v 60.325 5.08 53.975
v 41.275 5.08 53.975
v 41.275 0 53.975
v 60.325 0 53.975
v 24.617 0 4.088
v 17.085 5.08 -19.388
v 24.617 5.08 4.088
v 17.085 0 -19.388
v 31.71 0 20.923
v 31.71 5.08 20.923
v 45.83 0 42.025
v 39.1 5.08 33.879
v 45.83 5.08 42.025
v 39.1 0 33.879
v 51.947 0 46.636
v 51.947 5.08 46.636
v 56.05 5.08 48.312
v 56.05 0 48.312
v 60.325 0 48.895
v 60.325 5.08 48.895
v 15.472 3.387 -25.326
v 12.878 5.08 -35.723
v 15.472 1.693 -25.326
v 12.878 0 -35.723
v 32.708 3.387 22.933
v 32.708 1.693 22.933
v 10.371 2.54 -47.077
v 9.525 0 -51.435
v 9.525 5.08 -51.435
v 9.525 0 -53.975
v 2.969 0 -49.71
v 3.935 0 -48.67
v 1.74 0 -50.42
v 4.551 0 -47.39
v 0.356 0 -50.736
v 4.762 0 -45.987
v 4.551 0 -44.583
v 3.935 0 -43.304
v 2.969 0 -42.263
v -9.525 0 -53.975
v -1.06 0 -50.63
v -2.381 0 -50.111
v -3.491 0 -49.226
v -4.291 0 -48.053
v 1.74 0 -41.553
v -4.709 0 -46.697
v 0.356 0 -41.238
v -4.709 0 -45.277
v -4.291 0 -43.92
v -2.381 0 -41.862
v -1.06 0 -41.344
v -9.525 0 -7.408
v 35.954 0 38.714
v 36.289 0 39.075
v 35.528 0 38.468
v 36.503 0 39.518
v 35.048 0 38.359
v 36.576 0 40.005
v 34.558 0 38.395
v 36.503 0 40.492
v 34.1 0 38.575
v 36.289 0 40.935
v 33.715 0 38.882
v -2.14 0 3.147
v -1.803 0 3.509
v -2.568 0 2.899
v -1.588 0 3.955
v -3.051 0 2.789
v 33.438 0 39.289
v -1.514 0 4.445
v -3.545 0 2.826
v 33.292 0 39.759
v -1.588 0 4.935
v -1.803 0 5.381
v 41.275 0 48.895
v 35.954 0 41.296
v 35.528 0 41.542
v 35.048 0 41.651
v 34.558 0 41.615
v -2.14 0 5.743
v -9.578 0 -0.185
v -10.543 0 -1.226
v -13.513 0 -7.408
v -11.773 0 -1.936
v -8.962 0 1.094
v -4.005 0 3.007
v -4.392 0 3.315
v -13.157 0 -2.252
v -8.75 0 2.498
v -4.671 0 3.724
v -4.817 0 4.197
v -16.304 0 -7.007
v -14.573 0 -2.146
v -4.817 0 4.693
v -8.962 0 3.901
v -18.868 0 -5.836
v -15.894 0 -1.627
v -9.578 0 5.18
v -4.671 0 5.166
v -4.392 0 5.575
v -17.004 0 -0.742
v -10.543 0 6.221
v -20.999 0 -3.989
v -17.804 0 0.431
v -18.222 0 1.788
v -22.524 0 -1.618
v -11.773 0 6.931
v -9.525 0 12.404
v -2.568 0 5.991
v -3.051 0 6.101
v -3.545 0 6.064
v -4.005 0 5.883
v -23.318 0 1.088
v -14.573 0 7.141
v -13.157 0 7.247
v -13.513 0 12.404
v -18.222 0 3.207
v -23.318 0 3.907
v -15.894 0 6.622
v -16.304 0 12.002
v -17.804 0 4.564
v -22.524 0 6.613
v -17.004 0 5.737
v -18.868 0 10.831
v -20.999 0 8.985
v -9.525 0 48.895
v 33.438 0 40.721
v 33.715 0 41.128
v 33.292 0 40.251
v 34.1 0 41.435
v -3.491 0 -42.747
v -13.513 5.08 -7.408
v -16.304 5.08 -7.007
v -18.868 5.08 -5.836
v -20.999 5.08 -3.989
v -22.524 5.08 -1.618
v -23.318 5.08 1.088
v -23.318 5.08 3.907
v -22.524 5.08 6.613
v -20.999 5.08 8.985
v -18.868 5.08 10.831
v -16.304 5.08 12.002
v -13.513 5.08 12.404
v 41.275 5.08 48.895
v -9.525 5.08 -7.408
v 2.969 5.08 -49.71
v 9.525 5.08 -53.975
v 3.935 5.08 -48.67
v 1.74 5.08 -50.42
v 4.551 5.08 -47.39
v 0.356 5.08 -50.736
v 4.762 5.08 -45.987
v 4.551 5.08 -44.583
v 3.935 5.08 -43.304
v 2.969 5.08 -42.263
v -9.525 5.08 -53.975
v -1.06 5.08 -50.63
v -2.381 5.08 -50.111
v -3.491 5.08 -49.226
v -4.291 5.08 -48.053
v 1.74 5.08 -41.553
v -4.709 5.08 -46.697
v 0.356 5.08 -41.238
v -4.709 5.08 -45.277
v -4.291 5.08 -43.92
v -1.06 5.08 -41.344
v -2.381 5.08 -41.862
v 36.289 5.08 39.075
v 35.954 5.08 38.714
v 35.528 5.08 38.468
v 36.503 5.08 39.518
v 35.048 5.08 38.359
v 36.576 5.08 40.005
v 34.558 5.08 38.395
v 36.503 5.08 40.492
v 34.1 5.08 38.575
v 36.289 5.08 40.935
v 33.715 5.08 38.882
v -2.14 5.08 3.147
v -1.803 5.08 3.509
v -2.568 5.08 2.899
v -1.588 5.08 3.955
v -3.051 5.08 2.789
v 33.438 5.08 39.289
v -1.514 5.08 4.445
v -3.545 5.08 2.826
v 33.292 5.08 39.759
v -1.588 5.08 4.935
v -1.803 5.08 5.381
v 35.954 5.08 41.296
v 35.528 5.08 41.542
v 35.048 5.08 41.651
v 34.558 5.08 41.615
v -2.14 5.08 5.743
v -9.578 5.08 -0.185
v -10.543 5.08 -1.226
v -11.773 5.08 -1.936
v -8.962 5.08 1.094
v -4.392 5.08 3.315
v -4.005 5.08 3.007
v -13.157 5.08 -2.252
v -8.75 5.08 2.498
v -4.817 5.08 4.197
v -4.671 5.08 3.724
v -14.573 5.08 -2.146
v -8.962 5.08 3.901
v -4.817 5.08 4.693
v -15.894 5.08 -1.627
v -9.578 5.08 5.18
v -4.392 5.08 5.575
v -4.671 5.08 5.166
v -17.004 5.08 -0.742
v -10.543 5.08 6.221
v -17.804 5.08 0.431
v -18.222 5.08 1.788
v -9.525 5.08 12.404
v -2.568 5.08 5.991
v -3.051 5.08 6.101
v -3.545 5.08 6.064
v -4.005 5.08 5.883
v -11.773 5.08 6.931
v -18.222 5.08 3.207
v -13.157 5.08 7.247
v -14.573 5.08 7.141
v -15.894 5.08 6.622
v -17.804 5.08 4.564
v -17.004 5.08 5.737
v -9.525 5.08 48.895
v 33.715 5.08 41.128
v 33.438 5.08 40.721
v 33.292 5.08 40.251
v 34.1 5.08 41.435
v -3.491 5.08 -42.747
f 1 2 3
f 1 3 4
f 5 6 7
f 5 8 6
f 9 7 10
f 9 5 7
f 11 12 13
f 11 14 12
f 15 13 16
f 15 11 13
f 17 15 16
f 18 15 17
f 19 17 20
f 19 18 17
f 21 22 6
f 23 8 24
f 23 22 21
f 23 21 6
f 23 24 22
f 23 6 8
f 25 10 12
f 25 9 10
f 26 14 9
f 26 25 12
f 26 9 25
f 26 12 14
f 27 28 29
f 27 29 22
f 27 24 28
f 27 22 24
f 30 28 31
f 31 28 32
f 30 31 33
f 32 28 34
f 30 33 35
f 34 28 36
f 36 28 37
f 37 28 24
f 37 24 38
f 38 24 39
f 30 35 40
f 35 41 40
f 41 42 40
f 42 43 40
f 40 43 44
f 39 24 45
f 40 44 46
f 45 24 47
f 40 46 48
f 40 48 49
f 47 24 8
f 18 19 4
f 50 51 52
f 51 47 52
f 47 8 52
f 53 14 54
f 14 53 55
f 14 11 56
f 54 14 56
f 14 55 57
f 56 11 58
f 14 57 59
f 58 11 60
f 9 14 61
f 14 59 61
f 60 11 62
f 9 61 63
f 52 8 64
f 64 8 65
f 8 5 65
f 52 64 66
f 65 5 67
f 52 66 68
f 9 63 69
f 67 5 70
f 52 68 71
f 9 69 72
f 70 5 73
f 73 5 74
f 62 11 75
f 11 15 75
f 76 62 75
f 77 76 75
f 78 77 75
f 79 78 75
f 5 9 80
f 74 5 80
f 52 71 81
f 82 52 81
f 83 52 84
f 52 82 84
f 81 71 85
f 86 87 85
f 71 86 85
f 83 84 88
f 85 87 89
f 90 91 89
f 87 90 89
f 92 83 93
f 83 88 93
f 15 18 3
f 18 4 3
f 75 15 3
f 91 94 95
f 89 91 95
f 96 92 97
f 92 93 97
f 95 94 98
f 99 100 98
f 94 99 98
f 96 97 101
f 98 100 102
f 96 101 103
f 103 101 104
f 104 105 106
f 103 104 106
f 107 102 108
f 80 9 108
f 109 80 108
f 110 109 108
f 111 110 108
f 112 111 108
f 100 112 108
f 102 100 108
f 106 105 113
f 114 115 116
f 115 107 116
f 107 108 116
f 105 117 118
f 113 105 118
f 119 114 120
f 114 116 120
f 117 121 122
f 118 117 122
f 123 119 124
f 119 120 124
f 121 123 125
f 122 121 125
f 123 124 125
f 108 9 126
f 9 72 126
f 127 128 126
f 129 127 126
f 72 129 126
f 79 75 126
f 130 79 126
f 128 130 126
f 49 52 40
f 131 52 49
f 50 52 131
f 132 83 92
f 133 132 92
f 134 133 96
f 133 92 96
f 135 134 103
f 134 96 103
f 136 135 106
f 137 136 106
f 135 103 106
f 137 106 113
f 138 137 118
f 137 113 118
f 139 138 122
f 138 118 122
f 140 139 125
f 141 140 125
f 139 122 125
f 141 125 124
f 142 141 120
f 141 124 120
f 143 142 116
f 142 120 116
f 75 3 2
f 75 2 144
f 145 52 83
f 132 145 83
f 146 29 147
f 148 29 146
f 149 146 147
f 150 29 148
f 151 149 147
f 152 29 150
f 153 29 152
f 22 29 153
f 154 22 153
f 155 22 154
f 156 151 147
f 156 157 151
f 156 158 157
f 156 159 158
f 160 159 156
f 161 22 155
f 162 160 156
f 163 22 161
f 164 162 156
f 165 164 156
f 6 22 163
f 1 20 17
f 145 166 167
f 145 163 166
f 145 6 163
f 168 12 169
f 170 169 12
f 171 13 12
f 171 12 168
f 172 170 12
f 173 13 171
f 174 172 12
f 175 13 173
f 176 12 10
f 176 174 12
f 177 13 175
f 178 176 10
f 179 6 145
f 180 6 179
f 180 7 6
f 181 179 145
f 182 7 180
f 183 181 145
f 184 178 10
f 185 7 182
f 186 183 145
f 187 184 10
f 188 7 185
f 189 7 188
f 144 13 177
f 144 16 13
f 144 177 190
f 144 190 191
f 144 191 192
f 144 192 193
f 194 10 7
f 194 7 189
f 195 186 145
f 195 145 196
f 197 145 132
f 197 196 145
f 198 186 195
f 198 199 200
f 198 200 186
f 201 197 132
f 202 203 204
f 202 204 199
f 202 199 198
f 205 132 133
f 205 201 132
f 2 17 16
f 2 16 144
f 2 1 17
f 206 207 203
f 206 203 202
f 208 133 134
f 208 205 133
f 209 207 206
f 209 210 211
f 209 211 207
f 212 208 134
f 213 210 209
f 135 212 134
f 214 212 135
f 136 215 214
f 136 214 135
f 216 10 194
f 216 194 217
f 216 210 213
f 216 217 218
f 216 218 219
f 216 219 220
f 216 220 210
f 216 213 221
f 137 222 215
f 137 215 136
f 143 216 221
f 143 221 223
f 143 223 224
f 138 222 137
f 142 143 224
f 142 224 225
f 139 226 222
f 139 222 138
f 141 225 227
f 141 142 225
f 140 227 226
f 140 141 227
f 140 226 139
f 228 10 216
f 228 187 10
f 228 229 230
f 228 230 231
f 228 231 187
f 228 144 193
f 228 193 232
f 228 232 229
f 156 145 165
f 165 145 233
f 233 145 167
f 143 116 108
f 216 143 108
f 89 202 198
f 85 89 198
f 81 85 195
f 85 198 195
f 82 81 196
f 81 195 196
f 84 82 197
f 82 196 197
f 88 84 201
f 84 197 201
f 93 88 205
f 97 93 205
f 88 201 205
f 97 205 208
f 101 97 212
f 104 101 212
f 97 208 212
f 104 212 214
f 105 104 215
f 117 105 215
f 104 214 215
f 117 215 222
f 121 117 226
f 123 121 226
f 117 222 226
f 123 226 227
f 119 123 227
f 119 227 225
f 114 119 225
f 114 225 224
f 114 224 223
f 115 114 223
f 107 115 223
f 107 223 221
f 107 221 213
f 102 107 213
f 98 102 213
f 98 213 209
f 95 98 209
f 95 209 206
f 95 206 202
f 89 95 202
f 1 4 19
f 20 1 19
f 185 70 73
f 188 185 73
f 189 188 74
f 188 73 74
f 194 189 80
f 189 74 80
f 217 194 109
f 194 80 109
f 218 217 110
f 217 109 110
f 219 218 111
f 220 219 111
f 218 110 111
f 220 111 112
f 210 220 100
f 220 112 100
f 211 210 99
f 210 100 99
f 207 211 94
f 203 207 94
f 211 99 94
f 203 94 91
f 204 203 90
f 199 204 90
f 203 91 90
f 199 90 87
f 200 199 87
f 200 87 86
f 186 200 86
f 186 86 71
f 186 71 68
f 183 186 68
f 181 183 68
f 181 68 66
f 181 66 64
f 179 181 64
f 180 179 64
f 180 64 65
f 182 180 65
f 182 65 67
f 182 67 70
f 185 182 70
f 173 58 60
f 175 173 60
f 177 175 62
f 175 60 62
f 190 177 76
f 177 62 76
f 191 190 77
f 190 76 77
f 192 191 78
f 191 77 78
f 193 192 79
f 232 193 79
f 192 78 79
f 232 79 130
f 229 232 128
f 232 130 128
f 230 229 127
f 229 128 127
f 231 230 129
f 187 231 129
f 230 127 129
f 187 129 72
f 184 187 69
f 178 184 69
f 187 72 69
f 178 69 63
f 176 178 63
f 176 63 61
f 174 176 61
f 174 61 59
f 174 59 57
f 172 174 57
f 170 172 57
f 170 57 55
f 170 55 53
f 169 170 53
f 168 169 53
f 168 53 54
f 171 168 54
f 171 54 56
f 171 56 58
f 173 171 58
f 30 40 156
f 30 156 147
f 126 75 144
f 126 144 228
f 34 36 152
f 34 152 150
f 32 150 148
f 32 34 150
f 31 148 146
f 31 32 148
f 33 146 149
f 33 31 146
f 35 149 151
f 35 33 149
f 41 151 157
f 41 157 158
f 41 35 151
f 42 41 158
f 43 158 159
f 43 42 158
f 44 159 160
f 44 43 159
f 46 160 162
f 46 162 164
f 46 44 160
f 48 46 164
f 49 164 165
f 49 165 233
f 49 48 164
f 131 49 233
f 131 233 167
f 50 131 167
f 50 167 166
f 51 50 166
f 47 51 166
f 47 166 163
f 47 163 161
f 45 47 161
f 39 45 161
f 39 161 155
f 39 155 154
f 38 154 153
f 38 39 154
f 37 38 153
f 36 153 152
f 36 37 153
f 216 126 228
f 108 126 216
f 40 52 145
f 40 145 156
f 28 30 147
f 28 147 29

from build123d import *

# Parameters (mm, degrees)
SKETCH1_R               = 4.7625
BOSS_EXTRUDE1_DEPTH     = 5.08
SKETCH4_W               = 19.05
SKETCH4_H               = 5.08
BOSS_EXTRUDE2_DEPTH     = 5.08
SKETCH6_R               = 4.7625
BOSS_EXTRUDE3_DEPTH     = 5.08
SKETCH8_R               = 4.7625
CUT_EXTRUDE2_DEPTH      = 6.0800001
SKETCH5_R               = 1.651
SKETCH5_R_2             = 1.660728382
CUT_EXTRUDE1_DEPTH      = 1.0000001
CUT_EXTRUDE1_DEPTH_BACK = 6.0800001


with BuildPart() as part:
    # Sketch1 → Boss-Extrude1 (new body)
    with BuildSketch(Plane(origin=(0, 0, 0), x_dir=(1, 0, 0), z_dir=(0, 1, 0))):
        with BuildLine():
            Line((-9.525, 53.975), (9.525, 53.975))
            Line((9.525, 53.975), (9.525, 51.435))
            add(Edge.make_bspline(
                [(9.525, 51.435), (9.525, 51.21454564), (27.819109584, -48.895), (60.325, -48.895)],
                knots=[0, 0, 0, 0, 1, 1, 1, 1], degree=3))
            Line((60.325, -48.895), (-9.525, -48.895))
            Line((-9.525, -48.895), (-9.525, 53.975))
        make_face()
        with Locations((0, 45.9867)):
            Circle(SKETCH1_R, mode=Mode.SUBTRACT)
    extrude(amount=BOSS_EXTRUDE1_DEPTH)

    # Sketch4 → Boss-Extrude2 (add)
    with BuildSketch(Plane(origin=(0, 5.08, 0), x_dir=(1, 0, 0), z_dir=(0, 1, 0))):
        with Locations((50.8, -51.435)):
            Rectangle(SKETCH4_W, SKETCH4_H)
    extrude(amount=-BOSS_EXTRUDE2_DEPTH)

    # Sketch6 → Boss-Extrude3 (add)
    with BuildSketch(Plane.XZ):
        with BuildLine():
            Line((-13.5128, 12.403582), (-9.525, 12.403582))
            Line((-9.525, 12.403582), (-9.525, 11.565453148))
            ThreePointArc((-9.525, 11.565453148), (-3.6068, 2.497582), (-9.525, -6.570289148))
            Line((-9.525, -6.570289148), (-9.525, -7.408418))
            Line((-9.525, -7.408418), (-13.5128, -7.408418))
            ThreePointArc((-13.5128, -7.408418), (-23.4188, 2.497582), (-13.5128, 12.403582))
        make_face()
        with Locations((-13.5128, 2.497582)):
            Circle(SKETCH6_R, mode=Mode.SUBTRACT)
    extrude(amount=-BOSS_EXTRUDE3_DEPTH)

    # Sketch8 → Cut-Extrude2 (cut, through all)
    with BuildSketch(Plane(origin=(0, 5.08, 0), x_dir=(1, 0, 0), z_dir=(0, 1, 0))):
        with Locations((-13.5128, -2.497582)):
            Circle(SKETCH8_R)
    extrude(amount=-CUT_EXTRUDE2_DEPTH, mode=Mode.SUBTRACT)

    # Sketch5 → Cut-Extrude1 (cut, two sides)
    with BuildSketch(Plane.XZ) as cut_extrude1_sk:
        with Locations((34.925, 40.005)):
            Circle(SKETCH5_R)
        with Locations((-3.175, 4.445)):
            Circle(SKETCH5_R_2)
    extrude(amount=CUT_EXTRUDE1_DEPTH, mode=Mode.SUBTRACT)
    extrude(cut_extrude1_sk.sketch, amount=-CUT_EXTRUDE1_DEPTH_BACK, mode=Mode.SUBTRACT)


solid = part.part
